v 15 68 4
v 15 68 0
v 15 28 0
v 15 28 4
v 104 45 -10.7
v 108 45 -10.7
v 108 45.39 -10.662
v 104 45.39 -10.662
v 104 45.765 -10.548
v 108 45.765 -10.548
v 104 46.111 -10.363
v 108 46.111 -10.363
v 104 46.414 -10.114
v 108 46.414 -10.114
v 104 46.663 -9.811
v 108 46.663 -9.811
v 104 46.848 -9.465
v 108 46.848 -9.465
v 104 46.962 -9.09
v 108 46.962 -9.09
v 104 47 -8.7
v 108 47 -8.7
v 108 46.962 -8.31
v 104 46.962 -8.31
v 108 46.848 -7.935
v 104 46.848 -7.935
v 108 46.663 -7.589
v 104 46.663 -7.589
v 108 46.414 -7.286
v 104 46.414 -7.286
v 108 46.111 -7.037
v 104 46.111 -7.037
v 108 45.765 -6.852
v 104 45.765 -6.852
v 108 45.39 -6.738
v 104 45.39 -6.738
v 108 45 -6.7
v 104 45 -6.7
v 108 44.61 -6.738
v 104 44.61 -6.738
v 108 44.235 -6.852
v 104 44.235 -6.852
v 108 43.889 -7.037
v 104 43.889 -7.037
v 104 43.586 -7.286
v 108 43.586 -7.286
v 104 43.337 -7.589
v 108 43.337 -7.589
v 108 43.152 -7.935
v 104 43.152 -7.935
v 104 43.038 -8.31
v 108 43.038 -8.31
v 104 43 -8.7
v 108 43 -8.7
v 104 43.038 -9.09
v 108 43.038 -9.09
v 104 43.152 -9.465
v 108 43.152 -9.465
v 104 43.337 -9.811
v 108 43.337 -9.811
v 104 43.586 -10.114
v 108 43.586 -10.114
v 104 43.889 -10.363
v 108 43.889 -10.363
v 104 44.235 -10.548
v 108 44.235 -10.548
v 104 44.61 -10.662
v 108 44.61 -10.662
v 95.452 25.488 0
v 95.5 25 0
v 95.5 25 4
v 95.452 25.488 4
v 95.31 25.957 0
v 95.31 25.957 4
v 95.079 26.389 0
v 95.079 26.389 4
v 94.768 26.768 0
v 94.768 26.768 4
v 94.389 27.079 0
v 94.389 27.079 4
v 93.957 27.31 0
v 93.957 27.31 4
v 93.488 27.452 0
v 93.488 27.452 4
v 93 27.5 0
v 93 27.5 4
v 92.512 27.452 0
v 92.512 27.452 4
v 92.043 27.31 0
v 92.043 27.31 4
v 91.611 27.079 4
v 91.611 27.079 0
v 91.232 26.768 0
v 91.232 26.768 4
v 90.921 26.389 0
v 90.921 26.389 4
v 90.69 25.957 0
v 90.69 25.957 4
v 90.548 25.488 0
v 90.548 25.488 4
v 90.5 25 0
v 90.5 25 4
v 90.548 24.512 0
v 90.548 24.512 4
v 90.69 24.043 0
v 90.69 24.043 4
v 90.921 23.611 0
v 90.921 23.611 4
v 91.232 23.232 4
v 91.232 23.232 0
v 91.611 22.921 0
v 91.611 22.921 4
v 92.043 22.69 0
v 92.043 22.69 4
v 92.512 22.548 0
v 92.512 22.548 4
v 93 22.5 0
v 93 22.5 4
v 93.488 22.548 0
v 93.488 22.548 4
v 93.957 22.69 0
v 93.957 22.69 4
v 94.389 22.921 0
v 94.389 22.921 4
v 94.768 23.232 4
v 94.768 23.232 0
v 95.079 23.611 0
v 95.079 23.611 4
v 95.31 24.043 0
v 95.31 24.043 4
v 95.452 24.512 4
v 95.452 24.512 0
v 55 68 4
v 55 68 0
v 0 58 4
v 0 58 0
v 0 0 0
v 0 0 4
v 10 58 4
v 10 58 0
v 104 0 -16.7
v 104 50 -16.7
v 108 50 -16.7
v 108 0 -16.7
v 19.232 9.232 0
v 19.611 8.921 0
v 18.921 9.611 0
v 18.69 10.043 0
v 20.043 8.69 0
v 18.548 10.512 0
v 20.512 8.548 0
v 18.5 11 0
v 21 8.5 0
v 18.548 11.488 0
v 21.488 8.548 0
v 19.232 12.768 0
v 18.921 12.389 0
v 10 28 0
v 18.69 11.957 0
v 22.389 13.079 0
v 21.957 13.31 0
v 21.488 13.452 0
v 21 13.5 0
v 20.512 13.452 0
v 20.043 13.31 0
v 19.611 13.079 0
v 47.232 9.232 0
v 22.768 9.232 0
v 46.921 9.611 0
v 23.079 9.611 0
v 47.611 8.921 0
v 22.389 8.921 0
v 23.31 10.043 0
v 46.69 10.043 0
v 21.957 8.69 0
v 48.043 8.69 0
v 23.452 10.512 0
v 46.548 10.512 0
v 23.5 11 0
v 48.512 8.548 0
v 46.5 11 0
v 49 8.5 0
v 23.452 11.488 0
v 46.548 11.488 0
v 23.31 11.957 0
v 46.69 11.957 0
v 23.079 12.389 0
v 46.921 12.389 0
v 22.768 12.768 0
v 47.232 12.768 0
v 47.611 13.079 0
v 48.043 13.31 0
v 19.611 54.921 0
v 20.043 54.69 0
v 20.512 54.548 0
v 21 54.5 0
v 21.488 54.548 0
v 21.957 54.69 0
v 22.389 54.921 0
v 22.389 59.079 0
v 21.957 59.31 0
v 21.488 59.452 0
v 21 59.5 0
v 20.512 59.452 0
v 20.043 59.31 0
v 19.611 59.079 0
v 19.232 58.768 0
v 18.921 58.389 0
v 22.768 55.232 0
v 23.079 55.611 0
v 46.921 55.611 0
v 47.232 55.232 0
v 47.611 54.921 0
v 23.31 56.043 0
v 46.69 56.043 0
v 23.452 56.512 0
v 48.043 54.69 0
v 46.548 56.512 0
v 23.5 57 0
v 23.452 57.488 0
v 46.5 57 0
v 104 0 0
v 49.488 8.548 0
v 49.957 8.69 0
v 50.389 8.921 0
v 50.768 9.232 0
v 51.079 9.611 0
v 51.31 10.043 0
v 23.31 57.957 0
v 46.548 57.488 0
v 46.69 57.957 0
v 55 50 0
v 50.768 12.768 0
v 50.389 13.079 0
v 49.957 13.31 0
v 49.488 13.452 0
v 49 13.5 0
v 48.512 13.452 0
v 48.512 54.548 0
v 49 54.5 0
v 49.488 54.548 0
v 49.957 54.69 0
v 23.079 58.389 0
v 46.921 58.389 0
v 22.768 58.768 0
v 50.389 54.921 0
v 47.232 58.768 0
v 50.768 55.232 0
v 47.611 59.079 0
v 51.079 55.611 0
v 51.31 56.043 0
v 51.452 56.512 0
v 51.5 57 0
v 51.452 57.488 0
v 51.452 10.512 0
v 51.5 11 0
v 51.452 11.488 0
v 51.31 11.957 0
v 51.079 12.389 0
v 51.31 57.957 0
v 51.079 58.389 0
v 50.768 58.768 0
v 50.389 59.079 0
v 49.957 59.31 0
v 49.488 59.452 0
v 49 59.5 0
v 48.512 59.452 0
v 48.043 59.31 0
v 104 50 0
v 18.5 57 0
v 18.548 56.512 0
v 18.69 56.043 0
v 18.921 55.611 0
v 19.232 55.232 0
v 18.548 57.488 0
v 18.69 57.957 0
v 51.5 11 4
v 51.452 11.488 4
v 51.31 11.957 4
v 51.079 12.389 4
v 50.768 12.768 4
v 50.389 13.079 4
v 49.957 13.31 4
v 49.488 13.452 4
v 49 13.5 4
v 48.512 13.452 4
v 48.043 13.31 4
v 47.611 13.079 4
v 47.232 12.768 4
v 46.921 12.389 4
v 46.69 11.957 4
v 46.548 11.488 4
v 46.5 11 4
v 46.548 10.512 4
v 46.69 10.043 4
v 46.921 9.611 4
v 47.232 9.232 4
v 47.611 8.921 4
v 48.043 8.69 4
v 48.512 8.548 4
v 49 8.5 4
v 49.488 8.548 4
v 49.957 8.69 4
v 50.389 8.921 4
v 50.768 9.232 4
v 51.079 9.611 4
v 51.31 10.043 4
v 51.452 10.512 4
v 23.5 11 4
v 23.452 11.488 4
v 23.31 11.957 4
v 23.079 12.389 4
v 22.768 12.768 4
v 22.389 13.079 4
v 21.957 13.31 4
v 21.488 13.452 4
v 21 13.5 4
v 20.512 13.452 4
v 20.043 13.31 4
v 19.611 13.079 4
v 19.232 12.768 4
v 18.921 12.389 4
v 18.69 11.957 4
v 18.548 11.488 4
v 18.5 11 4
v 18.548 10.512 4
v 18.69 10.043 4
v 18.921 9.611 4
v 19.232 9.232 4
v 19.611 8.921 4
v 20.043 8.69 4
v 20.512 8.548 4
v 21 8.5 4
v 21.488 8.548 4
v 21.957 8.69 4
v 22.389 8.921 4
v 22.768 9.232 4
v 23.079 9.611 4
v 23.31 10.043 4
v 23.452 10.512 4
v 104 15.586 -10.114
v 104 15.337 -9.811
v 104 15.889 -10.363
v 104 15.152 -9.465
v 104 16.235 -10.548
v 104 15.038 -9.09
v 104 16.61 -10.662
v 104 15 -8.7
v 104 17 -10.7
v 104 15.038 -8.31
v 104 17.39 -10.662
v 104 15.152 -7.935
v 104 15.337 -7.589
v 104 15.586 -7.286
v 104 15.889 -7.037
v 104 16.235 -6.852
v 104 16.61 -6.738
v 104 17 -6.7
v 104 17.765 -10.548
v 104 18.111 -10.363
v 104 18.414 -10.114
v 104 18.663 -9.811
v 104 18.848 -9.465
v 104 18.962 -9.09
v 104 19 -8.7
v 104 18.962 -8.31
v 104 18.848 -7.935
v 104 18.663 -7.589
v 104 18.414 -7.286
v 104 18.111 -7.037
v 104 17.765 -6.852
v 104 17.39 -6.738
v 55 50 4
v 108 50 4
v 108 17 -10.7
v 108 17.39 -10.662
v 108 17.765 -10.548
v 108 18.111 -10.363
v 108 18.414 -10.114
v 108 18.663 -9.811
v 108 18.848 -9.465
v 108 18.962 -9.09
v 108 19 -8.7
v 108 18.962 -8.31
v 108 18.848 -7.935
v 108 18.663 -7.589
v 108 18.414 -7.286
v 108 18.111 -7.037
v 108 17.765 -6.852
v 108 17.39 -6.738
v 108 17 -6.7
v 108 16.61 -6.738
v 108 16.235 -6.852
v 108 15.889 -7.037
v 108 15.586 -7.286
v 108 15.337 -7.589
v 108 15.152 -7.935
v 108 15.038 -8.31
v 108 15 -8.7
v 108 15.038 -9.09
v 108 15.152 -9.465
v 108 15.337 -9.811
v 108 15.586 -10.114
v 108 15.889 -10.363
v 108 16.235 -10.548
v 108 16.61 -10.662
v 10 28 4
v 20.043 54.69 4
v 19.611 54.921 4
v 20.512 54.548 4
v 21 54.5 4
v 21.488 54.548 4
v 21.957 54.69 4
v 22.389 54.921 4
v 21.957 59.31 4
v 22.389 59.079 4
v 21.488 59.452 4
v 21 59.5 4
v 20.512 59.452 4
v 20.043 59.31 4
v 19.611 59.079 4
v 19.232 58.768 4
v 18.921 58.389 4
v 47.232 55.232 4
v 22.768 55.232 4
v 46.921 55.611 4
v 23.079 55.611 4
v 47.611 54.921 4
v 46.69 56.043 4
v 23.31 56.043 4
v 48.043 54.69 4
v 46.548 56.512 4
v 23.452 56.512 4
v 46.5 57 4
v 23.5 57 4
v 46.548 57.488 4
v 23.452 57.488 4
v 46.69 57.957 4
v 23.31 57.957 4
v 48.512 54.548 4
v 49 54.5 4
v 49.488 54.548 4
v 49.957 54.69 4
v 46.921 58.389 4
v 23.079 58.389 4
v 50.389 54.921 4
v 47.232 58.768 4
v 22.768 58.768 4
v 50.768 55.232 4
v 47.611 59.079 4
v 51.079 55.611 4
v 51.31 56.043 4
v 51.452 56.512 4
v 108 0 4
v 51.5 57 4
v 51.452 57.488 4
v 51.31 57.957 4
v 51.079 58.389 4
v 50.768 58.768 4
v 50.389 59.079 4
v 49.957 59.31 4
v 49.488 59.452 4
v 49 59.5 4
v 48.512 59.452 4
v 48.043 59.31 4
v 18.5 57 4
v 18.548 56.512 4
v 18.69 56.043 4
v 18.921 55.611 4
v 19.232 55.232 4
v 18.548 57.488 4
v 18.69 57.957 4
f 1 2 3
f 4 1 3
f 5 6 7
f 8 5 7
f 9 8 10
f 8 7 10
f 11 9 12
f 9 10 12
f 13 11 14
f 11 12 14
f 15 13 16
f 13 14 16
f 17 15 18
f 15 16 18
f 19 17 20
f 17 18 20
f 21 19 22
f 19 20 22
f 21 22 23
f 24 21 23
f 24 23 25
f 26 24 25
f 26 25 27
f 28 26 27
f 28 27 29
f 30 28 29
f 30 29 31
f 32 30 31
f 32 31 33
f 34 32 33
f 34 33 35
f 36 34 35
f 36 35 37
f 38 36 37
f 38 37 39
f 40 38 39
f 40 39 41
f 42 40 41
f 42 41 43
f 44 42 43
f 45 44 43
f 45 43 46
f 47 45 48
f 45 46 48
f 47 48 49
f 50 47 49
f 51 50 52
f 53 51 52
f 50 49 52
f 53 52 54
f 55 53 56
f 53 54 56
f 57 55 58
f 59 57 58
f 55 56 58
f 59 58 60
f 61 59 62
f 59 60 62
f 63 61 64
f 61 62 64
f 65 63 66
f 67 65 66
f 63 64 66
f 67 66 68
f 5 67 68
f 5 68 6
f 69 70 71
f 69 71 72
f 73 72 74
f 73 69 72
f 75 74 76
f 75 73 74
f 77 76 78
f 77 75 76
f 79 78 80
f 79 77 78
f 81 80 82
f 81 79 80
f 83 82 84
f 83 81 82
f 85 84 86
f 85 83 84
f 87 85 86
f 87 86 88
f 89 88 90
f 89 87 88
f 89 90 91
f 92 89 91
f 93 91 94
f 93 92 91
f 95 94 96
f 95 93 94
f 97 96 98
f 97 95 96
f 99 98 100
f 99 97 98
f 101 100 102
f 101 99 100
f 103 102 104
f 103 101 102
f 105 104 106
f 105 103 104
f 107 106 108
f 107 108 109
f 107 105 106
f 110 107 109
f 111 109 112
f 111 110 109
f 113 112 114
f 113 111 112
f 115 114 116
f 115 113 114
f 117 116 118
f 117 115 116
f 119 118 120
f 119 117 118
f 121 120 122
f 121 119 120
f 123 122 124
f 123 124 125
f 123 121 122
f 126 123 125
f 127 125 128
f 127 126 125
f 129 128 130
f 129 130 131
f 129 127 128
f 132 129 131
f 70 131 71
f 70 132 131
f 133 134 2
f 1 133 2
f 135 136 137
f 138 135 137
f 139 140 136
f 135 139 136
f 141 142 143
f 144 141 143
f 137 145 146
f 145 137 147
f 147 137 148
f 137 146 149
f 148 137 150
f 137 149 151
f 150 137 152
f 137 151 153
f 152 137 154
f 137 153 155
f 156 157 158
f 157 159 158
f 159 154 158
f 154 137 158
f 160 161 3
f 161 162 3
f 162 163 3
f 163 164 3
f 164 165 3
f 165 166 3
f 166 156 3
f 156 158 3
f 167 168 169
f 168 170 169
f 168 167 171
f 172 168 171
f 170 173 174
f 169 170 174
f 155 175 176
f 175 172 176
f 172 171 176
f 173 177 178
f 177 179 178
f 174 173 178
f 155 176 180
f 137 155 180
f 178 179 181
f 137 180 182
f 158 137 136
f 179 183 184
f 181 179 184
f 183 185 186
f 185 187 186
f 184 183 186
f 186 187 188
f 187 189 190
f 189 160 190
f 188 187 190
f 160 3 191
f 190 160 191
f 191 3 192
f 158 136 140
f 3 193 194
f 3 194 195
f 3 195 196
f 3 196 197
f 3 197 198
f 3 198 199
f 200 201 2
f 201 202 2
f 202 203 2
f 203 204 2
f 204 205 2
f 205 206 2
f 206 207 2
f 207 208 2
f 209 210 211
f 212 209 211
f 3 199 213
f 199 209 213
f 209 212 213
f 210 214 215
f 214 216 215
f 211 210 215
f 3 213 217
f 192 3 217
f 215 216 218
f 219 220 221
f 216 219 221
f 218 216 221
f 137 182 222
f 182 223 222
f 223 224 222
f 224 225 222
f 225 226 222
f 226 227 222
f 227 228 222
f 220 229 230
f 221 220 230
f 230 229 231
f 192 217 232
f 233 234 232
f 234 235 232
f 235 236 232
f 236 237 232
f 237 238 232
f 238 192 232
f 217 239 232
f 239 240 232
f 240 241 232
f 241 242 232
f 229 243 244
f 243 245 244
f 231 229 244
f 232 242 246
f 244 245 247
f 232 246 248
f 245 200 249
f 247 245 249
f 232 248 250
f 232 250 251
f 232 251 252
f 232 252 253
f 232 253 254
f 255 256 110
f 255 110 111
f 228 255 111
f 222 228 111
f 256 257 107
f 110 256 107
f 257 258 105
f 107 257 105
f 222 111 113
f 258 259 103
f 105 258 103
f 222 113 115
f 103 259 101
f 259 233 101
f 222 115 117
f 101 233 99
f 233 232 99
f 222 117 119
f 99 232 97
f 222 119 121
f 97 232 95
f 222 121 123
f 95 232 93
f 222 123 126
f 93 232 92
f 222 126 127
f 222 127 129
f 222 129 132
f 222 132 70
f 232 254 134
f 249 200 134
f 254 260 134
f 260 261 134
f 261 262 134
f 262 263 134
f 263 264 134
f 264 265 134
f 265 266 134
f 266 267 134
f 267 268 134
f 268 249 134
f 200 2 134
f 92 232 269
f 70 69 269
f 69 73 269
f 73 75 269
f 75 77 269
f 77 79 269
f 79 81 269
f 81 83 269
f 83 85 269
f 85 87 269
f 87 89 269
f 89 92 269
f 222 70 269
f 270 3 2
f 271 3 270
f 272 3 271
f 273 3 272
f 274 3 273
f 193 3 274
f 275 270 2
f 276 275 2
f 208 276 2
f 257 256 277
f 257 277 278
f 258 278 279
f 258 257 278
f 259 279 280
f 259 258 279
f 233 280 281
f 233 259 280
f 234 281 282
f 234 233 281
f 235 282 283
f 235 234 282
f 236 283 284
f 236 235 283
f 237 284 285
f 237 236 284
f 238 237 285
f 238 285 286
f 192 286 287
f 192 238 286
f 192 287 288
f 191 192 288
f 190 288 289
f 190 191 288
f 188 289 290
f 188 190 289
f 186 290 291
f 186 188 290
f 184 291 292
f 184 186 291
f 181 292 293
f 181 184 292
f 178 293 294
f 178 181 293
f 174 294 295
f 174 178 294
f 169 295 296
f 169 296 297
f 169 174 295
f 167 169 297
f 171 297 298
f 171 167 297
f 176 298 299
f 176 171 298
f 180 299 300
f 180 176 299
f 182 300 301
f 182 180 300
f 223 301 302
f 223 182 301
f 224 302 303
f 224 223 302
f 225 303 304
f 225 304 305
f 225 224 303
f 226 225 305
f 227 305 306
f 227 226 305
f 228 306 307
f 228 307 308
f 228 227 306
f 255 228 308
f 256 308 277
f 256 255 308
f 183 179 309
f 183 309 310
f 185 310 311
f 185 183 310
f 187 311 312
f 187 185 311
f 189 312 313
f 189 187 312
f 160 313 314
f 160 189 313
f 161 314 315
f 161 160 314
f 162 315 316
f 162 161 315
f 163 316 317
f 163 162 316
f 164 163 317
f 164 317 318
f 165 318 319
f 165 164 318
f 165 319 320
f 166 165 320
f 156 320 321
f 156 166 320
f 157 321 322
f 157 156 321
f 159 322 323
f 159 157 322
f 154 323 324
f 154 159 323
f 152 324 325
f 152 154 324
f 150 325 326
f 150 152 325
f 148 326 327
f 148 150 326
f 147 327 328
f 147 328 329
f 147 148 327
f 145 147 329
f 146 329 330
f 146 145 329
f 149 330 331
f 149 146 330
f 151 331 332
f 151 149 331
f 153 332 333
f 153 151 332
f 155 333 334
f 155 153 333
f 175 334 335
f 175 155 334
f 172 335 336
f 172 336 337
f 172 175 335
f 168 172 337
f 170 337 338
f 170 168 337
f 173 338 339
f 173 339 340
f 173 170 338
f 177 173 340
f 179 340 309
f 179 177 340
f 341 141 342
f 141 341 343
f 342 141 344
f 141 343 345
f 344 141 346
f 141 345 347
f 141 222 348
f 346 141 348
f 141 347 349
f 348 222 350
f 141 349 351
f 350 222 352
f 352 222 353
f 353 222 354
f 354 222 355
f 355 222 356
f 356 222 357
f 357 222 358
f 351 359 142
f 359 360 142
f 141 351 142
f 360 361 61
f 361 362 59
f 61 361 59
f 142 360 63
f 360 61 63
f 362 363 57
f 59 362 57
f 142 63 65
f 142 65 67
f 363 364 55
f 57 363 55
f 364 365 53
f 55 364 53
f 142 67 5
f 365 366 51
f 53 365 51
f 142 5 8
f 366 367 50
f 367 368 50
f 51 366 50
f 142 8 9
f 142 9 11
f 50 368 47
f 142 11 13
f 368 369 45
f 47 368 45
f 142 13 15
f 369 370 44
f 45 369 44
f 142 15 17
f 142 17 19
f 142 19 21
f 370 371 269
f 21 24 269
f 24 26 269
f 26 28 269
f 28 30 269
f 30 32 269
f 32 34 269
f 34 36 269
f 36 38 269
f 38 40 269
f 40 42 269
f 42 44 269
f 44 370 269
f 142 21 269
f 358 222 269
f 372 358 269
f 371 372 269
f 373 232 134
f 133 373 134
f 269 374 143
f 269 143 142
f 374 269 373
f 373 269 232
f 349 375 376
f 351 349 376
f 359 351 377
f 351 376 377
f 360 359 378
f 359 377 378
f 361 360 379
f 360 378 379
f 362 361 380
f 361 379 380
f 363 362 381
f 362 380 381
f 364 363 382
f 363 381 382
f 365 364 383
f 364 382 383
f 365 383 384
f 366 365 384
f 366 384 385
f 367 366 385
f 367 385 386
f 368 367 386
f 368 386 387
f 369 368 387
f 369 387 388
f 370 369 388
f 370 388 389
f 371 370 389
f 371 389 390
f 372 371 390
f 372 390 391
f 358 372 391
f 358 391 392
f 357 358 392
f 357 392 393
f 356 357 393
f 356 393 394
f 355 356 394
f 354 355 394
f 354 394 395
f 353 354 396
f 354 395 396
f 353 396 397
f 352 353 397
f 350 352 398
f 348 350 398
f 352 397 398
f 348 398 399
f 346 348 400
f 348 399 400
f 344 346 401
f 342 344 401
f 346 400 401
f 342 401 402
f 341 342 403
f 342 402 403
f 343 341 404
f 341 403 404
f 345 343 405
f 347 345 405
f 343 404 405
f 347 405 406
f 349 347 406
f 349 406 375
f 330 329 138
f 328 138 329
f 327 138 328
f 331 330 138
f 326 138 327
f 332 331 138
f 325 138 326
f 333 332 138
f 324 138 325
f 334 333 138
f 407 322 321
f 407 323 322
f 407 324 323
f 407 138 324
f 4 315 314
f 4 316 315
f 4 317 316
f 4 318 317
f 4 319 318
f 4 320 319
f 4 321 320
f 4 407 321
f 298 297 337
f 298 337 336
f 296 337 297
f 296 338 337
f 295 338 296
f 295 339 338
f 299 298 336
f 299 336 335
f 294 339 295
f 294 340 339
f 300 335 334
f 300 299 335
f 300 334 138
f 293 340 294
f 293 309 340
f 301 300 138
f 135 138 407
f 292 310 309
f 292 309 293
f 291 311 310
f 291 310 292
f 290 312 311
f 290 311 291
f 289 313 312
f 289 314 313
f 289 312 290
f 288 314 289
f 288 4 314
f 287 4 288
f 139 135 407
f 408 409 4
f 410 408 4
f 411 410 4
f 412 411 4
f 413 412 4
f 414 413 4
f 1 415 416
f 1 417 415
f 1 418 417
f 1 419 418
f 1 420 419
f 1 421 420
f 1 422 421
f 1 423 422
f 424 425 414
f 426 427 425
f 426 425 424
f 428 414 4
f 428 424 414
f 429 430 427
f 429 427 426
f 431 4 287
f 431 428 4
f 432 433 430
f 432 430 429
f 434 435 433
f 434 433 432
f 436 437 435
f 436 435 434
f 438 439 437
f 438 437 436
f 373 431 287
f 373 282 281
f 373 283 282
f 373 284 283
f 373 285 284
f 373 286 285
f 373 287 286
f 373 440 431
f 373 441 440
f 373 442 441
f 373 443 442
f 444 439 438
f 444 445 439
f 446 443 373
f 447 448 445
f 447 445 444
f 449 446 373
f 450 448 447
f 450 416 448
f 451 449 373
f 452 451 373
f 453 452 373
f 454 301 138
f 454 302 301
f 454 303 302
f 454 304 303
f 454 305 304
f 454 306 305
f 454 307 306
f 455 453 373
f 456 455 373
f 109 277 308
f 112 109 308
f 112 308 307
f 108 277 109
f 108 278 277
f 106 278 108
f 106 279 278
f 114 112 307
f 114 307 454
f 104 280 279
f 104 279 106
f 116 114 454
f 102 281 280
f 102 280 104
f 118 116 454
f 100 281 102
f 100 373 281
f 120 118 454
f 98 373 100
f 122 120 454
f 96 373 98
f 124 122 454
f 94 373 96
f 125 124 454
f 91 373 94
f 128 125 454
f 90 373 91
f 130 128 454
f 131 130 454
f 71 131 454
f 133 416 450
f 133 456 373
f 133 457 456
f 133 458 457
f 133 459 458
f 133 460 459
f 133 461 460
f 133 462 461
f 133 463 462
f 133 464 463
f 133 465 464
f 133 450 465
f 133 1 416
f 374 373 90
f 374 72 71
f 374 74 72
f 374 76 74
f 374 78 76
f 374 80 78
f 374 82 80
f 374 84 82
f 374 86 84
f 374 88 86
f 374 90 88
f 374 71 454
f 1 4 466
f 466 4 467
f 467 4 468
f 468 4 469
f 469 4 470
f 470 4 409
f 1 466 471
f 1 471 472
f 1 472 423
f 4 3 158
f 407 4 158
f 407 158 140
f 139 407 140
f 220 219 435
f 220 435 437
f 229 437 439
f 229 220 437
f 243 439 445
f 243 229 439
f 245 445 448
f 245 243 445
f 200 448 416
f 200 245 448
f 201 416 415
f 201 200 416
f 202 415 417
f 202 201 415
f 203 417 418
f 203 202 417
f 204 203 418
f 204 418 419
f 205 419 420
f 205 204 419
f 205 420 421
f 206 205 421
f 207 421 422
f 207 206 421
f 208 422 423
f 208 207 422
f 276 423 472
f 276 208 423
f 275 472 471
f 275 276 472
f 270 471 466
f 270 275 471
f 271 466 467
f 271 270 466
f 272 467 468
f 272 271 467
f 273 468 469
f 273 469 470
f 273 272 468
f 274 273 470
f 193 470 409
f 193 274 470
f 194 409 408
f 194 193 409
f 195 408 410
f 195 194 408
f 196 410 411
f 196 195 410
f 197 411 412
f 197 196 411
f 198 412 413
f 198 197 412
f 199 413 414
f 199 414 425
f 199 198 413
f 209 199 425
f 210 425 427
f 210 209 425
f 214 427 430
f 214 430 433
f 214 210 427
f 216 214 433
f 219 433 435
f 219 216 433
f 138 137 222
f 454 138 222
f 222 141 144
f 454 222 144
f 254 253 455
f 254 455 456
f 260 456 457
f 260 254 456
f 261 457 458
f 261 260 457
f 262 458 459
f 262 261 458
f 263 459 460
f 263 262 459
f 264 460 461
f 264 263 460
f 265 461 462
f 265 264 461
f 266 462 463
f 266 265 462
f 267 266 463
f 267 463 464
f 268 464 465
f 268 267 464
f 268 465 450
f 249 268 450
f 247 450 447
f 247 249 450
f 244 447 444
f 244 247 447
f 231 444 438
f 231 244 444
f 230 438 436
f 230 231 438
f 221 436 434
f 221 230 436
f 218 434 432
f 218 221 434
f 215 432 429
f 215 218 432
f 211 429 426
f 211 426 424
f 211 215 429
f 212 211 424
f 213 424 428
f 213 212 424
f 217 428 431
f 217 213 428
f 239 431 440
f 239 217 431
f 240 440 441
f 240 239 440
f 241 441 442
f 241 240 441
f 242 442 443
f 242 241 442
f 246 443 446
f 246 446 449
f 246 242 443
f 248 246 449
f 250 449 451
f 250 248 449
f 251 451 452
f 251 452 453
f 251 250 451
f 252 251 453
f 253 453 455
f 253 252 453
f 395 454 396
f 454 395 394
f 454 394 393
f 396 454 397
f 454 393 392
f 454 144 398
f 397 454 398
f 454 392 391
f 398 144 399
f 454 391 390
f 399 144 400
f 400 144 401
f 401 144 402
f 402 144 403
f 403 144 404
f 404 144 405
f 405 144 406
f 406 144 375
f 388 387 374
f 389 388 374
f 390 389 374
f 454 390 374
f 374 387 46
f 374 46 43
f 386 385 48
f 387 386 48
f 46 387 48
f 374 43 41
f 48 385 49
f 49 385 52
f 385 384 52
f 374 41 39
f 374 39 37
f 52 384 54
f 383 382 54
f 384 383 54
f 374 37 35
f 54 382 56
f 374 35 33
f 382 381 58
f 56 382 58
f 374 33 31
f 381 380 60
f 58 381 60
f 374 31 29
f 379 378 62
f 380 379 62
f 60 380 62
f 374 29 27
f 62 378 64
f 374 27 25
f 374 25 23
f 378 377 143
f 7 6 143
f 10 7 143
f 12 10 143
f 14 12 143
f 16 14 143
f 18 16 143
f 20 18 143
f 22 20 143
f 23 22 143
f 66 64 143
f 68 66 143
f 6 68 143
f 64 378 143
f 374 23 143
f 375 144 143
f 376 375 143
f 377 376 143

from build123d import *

# Parameters (mm, degrees)
SKETCH_1_R          = 2.5
EXTRUDE_1_DEPTH     = 4
SKETCH_2_W          = 4
SKETCH_2_H          = 50
EXTRUDE_2_DEPTH     = 20.7
SKETCH_3_R          = 2
CUT_EXTRUDE_1_DEPTH = 6.7
CUT_EXTRUDE_2_DEPTH = 10


with BuildPart() as part:
    # Эскиз1 → Бобышка-Вытянуть1 (new body)
    with BuildSketch(Plane.XY):
        Polygon((0, 0), (108, 0), (108, 50), (55, 50), (55, 68), (0, 68), align=None)
        with Locations((21, 57)):
            Circle(SKETCH_1_R, mode=Mode.SUBTRACT)
        with Locations((49, 57)):
            Circle(SKETCH_1_R, mode=Mode.SUBTRACT)
        with Locations((21, 11)):
            Circle(SKETCH_1_R, mode=Mode.SUBTRACT)
        with Locations((49, 11)):
            Circle(SKETCH_1_R, mode=Mode.SUBTRACT)
        with Locations((93, 25)):
            Circle(SKETCH_1_R, mode=Mode.SUBTRACT)
    extrude(amount=EXTRUDE_1_DEPTH)

    # Эскиз2 → Бобышка-Вытянуть2 (add)
    with BuildSketch(Plane.XY.offset(4)):
        with Locations((106, 25)):
            Rectangle(SKETCH_2_W, SKETCH_2_H)
    extrude(amount=-EXTRUDE_2_DEPTH)

    # Эскиз3 → Вырез-Вытянуть1 (cut)
    with BuildSketch(Plane(origin=(108, 0, 0), x_dir=(0, 0, -1), z_dir=(1, 0, 0))):
        with Locations((8.7, 45)):
            Circle(SKETCH_3_R)
        with Locations((8.7, 17)):
            Circle(SKETCH_3_R)
    extrude(amount=-CUT_EXTRUDE_1_DEPTH, mode=Mode.SUBTRACT)

    # Эскиз4 → Вырез-Вытянуть2 (cut)
    with BuildSketch(Plane(origin=(0, 0, 0), x_dir=(-1, 0, 0), z_dir=(0, 0, -1))):
        Polygon((0, 68), (-15, 68), (-15, 48), (-15, 28), (-10, 28), (-10, 58), (0, 58), align=None)
    extrude(amount=-CUT_EXTRUDE_2_DEPTH, mode=Mode.SUBTRACT)


solid = part.part
